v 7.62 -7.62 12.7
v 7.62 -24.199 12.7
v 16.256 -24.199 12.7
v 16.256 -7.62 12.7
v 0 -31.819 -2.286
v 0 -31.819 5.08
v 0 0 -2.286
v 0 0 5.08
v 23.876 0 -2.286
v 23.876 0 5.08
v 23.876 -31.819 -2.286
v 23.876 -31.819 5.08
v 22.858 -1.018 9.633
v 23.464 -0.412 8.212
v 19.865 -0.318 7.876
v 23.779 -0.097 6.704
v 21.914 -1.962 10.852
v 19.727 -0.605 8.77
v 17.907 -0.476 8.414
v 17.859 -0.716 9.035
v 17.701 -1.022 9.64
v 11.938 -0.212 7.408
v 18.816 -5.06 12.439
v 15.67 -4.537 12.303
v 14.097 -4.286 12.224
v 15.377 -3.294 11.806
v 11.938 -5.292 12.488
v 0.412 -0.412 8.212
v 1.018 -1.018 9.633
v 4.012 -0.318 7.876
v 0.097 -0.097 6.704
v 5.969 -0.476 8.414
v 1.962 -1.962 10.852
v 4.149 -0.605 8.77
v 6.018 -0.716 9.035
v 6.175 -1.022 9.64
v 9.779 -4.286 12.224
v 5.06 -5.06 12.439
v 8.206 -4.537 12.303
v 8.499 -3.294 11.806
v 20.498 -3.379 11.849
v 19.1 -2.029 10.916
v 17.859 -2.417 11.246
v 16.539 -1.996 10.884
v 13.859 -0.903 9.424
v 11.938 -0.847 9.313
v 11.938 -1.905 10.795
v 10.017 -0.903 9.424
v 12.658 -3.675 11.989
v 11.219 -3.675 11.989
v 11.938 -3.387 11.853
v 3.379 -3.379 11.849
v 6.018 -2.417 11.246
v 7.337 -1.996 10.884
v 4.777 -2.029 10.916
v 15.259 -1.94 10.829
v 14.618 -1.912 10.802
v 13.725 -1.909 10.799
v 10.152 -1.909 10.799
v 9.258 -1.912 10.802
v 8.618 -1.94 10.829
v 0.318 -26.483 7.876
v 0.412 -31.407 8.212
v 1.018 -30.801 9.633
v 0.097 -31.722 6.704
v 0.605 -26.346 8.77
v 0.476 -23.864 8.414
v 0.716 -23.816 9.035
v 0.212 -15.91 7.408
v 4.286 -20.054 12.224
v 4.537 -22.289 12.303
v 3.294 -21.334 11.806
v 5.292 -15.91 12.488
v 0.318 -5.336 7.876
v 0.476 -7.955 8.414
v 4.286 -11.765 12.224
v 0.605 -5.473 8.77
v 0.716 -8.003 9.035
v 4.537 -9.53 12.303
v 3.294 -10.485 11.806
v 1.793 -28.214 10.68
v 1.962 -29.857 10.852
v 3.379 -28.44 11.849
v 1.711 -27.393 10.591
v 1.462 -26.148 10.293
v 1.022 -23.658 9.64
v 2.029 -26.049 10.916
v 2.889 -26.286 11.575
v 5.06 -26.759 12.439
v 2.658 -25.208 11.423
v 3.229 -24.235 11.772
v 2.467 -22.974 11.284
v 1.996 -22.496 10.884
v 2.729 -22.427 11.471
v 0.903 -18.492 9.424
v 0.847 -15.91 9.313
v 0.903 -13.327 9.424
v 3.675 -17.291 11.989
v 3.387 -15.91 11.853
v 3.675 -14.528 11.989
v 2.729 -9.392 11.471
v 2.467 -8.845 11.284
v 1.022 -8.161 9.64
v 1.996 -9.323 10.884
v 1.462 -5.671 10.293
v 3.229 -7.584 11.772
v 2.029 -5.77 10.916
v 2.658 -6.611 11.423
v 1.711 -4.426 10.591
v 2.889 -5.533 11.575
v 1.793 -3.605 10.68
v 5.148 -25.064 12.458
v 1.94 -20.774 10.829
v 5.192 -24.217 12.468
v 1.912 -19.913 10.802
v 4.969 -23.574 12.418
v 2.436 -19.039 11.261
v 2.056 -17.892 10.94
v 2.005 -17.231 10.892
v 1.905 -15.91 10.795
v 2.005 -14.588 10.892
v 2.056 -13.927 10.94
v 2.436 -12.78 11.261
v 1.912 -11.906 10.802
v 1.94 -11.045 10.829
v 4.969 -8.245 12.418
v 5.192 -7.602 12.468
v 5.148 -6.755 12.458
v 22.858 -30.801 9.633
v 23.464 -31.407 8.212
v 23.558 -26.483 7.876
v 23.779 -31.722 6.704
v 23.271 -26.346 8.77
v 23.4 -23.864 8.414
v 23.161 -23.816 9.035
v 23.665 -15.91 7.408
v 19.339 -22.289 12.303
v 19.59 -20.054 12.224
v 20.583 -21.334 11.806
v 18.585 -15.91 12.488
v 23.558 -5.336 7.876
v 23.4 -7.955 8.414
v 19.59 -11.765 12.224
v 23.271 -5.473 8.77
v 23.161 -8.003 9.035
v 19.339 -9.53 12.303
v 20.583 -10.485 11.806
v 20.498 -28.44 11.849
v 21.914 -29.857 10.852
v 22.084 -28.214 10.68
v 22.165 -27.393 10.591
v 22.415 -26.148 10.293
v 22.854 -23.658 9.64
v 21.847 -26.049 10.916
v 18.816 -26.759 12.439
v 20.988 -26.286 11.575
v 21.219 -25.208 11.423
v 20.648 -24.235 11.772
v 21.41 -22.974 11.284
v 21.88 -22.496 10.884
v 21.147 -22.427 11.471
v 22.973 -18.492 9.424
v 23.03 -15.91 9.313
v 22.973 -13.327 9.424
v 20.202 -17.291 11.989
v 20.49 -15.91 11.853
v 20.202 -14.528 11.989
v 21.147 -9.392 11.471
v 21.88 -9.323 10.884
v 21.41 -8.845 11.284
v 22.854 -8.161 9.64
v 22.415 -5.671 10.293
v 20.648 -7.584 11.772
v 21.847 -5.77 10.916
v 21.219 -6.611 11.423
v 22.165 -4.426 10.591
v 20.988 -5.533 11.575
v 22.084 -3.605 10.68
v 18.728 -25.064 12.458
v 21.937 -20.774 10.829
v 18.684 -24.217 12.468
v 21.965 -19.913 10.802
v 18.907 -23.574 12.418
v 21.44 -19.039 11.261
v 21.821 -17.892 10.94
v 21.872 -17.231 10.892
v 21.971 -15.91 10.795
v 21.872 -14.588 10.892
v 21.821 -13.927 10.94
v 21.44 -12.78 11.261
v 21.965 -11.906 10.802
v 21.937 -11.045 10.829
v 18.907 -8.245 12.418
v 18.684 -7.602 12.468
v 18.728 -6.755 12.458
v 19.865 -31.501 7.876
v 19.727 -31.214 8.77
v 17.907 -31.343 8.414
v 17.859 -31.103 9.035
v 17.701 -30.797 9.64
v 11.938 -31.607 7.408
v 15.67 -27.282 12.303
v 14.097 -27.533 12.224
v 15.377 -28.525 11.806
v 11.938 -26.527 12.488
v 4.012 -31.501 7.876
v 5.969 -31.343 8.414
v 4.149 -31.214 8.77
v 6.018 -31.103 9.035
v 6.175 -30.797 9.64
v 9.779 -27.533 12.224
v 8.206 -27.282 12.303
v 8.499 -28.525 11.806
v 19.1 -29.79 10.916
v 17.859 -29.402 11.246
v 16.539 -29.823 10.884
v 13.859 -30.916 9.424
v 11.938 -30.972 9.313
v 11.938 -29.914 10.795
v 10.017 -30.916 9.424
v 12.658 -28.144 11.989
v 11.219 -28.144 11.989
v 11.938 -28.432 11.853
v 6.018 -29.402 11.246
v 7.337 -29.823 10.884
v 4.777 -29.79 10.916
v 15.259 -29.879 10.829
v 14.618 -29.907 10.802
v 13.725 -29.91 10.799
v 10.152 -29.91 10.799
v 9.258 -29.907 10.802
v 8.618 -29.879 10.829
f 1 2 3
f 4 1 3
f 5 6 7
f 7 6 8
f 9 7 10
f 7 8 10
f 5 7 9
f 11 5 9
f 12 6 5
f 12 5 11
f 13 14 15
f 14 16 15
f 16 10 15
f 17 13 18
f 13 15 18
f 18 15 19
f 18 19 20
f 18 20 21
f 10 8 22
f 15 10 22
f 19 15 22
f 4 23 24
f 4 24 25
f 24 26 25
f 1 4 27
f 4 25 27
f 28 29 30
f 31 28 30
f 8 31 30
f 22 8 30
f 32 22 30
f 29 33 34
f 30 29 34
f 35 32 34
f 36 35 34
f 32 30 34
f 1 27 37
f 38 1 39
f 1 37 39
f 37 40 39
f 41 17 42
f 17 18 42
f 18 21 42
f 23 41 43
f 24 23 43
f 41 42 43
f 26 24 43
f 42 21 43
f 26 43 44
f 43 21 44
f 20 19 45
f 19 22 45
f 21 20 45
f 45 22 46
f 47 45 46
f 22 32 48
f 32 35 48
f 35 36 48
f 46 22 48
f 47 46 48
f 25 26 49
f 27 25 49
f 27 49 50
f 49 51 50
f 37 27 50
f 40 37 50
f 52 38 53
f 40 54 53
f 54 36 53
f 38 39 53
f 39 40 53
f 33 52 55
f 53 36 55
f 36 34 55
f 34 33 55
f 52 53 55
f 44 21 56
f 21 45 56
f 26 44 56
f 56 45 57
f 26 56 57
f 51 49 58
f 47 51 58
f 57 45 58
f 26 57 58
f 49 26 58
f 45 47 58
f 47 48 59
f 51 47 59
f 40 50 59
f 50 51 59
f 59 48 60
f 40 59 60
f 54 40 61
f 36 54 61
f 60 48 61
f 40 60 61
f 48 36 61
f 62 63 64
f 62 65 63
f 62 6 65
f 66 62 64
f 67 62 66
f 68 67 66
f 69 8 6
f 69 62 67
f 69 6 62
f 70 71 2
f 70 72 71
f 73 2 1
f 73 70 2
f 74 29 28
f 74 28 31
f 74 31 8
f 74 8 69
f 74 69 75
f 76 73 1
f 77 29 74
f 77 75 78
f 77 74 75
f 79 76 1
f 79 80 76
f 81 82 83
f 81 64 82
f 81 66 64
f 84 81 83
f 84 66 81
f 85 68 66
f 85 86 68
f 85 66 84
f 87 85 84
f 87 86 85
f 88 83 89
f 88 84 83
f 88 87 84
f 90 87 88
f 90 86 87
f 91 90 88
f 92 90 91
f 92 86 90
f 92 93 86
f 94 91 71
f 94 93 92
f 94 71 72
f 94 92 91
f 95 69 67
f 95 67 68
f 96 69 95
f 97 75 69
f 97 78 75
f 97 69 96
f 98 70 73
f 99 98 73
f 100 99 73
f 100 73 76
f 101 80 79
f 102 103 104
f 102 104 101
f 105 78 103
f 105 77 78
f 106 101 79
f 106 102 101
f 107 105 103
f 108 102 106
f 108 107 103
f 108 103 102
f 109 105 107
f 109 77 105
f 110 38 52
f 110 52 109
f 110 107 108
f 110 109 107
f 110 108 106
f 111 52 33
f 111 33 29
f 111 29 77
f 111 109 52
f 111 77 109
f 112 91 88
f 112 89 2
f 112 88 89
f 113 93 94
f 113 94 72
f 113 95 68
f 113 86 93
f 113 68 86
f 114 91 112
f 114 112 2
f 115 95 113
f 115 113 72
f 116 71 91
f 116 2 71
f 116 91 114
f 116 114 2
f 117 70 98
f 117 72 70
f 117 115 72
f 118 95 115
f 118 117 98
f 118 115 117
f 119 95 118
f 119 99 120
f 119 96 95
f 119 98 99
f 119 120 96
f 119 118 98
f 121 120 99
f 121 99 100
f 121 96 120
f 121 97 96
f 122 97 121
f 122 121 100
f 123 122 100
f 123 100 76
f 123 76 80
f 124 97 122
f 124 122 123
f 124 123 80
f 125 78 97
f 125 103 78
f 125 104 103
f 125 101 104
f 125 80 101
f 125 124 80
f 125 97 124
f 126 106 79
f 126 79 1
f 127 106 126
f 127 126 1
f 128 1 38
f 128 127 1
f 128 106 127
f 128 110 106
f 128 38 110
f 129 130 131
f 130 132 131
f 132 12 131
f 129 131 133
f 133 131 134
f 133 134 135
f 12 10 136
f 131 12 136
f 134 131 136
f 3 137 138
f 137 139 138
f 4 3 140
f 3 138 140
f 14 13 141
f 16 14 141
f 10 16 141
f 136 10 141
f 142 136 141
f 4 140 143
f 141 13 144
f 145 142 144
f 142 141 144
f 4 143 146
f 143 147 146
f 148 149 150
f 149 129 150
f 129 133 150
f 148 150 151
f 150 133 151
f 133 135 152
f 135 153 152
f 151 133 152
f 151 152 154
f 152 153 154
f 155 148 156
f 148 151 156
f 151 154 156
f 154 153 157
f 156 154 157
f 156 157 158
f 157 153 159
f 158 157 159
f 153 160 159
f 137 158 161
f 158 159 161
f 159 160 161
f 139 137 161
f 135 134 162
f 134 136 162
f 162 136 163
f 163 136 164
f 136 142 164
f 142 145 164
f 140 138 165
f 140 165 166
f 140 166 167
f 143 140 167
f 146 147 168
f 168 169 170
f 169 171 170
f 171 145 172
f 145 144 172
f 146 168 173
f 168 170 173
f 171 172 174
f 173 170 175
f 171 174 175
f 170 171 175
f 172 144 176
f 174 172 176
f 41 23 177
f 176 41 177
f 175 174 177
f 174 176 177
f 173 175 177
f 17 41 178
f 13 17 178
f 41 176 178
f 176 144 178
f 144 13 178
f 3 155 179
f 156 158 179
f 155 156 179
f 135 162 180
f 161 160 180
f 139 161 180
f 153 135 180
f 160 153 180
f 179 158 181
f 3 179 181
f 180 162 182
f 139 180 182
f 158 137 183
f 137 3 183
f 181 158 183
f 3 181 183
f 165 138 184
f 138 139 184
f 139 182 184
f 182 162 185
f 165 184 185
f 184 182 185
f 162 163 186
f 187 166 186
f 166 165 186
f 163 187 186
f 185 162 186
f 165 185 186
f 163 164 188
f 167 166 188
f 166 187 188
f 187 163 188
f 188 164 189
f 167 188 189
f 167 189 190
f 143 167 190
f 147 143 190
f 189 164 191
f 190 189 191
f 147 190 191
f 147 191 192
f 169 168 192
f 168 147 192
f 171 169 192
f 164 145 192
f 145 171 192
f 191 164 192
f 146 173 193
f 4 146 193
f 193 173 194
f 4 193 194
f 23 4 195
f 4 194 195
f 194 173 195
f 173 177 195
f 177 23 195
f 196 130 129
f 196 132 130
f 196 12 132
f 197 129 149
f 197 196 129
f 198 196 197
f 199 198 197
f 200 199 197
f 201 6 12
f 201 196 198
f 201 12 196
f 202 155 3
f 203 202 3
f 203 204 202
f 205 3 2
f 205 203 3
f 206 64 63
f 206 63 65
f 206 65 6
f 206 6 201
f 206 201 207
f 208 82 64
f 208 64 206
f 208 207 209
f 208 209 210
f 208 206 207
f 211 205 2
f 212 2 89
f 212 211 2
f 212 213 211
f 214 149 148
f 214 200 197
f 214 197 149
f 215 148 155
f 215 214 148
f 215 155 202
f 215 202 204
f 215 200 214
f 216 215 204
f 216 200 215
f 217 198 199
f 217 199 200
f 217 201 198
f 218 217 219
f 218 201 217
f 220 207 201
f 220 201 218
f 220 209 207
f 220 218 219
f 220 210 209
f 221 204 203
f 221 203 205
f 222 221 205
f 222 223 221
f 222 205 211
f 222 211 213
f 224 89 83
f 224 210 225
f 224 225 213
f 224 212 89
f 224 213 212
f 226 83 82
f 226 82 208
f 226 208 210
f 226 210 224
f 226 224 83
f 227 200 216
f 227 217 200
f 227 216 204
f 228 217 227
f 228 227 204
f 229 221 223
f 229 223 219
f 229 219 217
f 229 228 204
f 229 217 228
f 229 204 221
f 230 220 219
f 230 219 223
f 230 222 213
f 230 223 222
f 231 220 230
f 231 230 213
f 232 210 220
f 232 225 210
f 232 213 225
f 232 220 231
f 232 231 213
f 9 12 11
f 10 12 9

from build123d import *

# Parameters (mm, degrees)
F0_W        = 23.8764360547
F0_H        = 31.8190380931
F3_DEPTH    = 12.7
F1_T1_DEPTH = 69.9190380931
F1_T3_DEPTH = 61.9764360547
F2_DEPTH    = 2.286


# Not quite as in the source:
# - a fillet or chamfer that OpenCascade refuses, or shapes differently, is made with other operations: its cross-section is extruded or revolved along the edge and cut away or added


with BuildPart() as f3:
    # F0 (on Top) → F3 (new body)
    with BuildSketch(Plane.XY):
        with Locations((11.9382180274, -15.9095190465)):
            Rectangle(F0_W, F0_H)
    extrude(amount=F3_DEPTH)

    # F1: fillet of radius 7.62 on 4 edges, made by hand

    # F1_s2 → F1_t1 (cut)
    with BuildSketch(Plane.XZ.offset(-19.05)):
        with BuildLine():
            add(Edge.make_bspline(
                [(23.8764360547, 5.08), (23.8764360547, 12.7), (16.2564360547, 12.7)],
                knots=[0, 0, 0, 1, 1, 1], degree=2, weights=[1, 1, 1]))
            Line((16.2564360547, 12.7), (23.8764360547, 12.7))
            Line((23.8764360547, 12.7), (23.8764360547, 5.08))
        make_face()
        with BuildLine():
            add(Edge.make_bspline(
                [(0, 5.08), (0, 12.7), (7.62, 12.7)],
                knots=[0, 0, 0, 1, 1, 1], degree=2, weights=[1, 1, 1]))
            Line((7.62, 12.7), (0, 12.7))
            Line((0, 12.7), (0, 5.08))
        make_face()
    extrude(amount=F1_T1_DEPTH, mode=Mode.SUBTRACT)

    # F1_s4 → F1_t3 (cut)
    with BuildSketch(Plane.YZ.offset(-19.05)):
        with BuildLine():
            add(Edge.make_bspline(
                [(0, 5.08), (0, 12.7), (-7.62, 12.7)],
                knots=[0, 0, 0, 1, 1, 1], degree=2, weights=[1, 1, 1]))
            Line((-7.62, 12.7), (0, 12.7))
            Line((0, 12.7), (0, 5.08))
        make_face()
        with BuildLine():
            add(Edge.make_bspline(
                [(-31.8190380931, 5.08), (-31.8190380931, 12.7), (-24.1990380931, 12.7)],
                knots=[0, 0, 0, 1, 1, 1], degree=2, weights=[1, 1, 1]))
            Line((-24.1990380931, 12.7), (-31.8190380931, 12.7))
            Line((-31.8190380931, 12.7), (-31.8190380931, 5.08))
        make_face()
    extrude(amount=F1_T3_DEPTH, mode=Mode.SUBTRACT)

    # F2 (add): a face of the model
    f2_faces = [f3.faces().sort_by_distance(p)[0] for p in [
        (11.9382180274, -15.9095190465, 0),
    ]]
    extrude(f2_faces, amount=F2_DEPTH)


solid = f3.part
